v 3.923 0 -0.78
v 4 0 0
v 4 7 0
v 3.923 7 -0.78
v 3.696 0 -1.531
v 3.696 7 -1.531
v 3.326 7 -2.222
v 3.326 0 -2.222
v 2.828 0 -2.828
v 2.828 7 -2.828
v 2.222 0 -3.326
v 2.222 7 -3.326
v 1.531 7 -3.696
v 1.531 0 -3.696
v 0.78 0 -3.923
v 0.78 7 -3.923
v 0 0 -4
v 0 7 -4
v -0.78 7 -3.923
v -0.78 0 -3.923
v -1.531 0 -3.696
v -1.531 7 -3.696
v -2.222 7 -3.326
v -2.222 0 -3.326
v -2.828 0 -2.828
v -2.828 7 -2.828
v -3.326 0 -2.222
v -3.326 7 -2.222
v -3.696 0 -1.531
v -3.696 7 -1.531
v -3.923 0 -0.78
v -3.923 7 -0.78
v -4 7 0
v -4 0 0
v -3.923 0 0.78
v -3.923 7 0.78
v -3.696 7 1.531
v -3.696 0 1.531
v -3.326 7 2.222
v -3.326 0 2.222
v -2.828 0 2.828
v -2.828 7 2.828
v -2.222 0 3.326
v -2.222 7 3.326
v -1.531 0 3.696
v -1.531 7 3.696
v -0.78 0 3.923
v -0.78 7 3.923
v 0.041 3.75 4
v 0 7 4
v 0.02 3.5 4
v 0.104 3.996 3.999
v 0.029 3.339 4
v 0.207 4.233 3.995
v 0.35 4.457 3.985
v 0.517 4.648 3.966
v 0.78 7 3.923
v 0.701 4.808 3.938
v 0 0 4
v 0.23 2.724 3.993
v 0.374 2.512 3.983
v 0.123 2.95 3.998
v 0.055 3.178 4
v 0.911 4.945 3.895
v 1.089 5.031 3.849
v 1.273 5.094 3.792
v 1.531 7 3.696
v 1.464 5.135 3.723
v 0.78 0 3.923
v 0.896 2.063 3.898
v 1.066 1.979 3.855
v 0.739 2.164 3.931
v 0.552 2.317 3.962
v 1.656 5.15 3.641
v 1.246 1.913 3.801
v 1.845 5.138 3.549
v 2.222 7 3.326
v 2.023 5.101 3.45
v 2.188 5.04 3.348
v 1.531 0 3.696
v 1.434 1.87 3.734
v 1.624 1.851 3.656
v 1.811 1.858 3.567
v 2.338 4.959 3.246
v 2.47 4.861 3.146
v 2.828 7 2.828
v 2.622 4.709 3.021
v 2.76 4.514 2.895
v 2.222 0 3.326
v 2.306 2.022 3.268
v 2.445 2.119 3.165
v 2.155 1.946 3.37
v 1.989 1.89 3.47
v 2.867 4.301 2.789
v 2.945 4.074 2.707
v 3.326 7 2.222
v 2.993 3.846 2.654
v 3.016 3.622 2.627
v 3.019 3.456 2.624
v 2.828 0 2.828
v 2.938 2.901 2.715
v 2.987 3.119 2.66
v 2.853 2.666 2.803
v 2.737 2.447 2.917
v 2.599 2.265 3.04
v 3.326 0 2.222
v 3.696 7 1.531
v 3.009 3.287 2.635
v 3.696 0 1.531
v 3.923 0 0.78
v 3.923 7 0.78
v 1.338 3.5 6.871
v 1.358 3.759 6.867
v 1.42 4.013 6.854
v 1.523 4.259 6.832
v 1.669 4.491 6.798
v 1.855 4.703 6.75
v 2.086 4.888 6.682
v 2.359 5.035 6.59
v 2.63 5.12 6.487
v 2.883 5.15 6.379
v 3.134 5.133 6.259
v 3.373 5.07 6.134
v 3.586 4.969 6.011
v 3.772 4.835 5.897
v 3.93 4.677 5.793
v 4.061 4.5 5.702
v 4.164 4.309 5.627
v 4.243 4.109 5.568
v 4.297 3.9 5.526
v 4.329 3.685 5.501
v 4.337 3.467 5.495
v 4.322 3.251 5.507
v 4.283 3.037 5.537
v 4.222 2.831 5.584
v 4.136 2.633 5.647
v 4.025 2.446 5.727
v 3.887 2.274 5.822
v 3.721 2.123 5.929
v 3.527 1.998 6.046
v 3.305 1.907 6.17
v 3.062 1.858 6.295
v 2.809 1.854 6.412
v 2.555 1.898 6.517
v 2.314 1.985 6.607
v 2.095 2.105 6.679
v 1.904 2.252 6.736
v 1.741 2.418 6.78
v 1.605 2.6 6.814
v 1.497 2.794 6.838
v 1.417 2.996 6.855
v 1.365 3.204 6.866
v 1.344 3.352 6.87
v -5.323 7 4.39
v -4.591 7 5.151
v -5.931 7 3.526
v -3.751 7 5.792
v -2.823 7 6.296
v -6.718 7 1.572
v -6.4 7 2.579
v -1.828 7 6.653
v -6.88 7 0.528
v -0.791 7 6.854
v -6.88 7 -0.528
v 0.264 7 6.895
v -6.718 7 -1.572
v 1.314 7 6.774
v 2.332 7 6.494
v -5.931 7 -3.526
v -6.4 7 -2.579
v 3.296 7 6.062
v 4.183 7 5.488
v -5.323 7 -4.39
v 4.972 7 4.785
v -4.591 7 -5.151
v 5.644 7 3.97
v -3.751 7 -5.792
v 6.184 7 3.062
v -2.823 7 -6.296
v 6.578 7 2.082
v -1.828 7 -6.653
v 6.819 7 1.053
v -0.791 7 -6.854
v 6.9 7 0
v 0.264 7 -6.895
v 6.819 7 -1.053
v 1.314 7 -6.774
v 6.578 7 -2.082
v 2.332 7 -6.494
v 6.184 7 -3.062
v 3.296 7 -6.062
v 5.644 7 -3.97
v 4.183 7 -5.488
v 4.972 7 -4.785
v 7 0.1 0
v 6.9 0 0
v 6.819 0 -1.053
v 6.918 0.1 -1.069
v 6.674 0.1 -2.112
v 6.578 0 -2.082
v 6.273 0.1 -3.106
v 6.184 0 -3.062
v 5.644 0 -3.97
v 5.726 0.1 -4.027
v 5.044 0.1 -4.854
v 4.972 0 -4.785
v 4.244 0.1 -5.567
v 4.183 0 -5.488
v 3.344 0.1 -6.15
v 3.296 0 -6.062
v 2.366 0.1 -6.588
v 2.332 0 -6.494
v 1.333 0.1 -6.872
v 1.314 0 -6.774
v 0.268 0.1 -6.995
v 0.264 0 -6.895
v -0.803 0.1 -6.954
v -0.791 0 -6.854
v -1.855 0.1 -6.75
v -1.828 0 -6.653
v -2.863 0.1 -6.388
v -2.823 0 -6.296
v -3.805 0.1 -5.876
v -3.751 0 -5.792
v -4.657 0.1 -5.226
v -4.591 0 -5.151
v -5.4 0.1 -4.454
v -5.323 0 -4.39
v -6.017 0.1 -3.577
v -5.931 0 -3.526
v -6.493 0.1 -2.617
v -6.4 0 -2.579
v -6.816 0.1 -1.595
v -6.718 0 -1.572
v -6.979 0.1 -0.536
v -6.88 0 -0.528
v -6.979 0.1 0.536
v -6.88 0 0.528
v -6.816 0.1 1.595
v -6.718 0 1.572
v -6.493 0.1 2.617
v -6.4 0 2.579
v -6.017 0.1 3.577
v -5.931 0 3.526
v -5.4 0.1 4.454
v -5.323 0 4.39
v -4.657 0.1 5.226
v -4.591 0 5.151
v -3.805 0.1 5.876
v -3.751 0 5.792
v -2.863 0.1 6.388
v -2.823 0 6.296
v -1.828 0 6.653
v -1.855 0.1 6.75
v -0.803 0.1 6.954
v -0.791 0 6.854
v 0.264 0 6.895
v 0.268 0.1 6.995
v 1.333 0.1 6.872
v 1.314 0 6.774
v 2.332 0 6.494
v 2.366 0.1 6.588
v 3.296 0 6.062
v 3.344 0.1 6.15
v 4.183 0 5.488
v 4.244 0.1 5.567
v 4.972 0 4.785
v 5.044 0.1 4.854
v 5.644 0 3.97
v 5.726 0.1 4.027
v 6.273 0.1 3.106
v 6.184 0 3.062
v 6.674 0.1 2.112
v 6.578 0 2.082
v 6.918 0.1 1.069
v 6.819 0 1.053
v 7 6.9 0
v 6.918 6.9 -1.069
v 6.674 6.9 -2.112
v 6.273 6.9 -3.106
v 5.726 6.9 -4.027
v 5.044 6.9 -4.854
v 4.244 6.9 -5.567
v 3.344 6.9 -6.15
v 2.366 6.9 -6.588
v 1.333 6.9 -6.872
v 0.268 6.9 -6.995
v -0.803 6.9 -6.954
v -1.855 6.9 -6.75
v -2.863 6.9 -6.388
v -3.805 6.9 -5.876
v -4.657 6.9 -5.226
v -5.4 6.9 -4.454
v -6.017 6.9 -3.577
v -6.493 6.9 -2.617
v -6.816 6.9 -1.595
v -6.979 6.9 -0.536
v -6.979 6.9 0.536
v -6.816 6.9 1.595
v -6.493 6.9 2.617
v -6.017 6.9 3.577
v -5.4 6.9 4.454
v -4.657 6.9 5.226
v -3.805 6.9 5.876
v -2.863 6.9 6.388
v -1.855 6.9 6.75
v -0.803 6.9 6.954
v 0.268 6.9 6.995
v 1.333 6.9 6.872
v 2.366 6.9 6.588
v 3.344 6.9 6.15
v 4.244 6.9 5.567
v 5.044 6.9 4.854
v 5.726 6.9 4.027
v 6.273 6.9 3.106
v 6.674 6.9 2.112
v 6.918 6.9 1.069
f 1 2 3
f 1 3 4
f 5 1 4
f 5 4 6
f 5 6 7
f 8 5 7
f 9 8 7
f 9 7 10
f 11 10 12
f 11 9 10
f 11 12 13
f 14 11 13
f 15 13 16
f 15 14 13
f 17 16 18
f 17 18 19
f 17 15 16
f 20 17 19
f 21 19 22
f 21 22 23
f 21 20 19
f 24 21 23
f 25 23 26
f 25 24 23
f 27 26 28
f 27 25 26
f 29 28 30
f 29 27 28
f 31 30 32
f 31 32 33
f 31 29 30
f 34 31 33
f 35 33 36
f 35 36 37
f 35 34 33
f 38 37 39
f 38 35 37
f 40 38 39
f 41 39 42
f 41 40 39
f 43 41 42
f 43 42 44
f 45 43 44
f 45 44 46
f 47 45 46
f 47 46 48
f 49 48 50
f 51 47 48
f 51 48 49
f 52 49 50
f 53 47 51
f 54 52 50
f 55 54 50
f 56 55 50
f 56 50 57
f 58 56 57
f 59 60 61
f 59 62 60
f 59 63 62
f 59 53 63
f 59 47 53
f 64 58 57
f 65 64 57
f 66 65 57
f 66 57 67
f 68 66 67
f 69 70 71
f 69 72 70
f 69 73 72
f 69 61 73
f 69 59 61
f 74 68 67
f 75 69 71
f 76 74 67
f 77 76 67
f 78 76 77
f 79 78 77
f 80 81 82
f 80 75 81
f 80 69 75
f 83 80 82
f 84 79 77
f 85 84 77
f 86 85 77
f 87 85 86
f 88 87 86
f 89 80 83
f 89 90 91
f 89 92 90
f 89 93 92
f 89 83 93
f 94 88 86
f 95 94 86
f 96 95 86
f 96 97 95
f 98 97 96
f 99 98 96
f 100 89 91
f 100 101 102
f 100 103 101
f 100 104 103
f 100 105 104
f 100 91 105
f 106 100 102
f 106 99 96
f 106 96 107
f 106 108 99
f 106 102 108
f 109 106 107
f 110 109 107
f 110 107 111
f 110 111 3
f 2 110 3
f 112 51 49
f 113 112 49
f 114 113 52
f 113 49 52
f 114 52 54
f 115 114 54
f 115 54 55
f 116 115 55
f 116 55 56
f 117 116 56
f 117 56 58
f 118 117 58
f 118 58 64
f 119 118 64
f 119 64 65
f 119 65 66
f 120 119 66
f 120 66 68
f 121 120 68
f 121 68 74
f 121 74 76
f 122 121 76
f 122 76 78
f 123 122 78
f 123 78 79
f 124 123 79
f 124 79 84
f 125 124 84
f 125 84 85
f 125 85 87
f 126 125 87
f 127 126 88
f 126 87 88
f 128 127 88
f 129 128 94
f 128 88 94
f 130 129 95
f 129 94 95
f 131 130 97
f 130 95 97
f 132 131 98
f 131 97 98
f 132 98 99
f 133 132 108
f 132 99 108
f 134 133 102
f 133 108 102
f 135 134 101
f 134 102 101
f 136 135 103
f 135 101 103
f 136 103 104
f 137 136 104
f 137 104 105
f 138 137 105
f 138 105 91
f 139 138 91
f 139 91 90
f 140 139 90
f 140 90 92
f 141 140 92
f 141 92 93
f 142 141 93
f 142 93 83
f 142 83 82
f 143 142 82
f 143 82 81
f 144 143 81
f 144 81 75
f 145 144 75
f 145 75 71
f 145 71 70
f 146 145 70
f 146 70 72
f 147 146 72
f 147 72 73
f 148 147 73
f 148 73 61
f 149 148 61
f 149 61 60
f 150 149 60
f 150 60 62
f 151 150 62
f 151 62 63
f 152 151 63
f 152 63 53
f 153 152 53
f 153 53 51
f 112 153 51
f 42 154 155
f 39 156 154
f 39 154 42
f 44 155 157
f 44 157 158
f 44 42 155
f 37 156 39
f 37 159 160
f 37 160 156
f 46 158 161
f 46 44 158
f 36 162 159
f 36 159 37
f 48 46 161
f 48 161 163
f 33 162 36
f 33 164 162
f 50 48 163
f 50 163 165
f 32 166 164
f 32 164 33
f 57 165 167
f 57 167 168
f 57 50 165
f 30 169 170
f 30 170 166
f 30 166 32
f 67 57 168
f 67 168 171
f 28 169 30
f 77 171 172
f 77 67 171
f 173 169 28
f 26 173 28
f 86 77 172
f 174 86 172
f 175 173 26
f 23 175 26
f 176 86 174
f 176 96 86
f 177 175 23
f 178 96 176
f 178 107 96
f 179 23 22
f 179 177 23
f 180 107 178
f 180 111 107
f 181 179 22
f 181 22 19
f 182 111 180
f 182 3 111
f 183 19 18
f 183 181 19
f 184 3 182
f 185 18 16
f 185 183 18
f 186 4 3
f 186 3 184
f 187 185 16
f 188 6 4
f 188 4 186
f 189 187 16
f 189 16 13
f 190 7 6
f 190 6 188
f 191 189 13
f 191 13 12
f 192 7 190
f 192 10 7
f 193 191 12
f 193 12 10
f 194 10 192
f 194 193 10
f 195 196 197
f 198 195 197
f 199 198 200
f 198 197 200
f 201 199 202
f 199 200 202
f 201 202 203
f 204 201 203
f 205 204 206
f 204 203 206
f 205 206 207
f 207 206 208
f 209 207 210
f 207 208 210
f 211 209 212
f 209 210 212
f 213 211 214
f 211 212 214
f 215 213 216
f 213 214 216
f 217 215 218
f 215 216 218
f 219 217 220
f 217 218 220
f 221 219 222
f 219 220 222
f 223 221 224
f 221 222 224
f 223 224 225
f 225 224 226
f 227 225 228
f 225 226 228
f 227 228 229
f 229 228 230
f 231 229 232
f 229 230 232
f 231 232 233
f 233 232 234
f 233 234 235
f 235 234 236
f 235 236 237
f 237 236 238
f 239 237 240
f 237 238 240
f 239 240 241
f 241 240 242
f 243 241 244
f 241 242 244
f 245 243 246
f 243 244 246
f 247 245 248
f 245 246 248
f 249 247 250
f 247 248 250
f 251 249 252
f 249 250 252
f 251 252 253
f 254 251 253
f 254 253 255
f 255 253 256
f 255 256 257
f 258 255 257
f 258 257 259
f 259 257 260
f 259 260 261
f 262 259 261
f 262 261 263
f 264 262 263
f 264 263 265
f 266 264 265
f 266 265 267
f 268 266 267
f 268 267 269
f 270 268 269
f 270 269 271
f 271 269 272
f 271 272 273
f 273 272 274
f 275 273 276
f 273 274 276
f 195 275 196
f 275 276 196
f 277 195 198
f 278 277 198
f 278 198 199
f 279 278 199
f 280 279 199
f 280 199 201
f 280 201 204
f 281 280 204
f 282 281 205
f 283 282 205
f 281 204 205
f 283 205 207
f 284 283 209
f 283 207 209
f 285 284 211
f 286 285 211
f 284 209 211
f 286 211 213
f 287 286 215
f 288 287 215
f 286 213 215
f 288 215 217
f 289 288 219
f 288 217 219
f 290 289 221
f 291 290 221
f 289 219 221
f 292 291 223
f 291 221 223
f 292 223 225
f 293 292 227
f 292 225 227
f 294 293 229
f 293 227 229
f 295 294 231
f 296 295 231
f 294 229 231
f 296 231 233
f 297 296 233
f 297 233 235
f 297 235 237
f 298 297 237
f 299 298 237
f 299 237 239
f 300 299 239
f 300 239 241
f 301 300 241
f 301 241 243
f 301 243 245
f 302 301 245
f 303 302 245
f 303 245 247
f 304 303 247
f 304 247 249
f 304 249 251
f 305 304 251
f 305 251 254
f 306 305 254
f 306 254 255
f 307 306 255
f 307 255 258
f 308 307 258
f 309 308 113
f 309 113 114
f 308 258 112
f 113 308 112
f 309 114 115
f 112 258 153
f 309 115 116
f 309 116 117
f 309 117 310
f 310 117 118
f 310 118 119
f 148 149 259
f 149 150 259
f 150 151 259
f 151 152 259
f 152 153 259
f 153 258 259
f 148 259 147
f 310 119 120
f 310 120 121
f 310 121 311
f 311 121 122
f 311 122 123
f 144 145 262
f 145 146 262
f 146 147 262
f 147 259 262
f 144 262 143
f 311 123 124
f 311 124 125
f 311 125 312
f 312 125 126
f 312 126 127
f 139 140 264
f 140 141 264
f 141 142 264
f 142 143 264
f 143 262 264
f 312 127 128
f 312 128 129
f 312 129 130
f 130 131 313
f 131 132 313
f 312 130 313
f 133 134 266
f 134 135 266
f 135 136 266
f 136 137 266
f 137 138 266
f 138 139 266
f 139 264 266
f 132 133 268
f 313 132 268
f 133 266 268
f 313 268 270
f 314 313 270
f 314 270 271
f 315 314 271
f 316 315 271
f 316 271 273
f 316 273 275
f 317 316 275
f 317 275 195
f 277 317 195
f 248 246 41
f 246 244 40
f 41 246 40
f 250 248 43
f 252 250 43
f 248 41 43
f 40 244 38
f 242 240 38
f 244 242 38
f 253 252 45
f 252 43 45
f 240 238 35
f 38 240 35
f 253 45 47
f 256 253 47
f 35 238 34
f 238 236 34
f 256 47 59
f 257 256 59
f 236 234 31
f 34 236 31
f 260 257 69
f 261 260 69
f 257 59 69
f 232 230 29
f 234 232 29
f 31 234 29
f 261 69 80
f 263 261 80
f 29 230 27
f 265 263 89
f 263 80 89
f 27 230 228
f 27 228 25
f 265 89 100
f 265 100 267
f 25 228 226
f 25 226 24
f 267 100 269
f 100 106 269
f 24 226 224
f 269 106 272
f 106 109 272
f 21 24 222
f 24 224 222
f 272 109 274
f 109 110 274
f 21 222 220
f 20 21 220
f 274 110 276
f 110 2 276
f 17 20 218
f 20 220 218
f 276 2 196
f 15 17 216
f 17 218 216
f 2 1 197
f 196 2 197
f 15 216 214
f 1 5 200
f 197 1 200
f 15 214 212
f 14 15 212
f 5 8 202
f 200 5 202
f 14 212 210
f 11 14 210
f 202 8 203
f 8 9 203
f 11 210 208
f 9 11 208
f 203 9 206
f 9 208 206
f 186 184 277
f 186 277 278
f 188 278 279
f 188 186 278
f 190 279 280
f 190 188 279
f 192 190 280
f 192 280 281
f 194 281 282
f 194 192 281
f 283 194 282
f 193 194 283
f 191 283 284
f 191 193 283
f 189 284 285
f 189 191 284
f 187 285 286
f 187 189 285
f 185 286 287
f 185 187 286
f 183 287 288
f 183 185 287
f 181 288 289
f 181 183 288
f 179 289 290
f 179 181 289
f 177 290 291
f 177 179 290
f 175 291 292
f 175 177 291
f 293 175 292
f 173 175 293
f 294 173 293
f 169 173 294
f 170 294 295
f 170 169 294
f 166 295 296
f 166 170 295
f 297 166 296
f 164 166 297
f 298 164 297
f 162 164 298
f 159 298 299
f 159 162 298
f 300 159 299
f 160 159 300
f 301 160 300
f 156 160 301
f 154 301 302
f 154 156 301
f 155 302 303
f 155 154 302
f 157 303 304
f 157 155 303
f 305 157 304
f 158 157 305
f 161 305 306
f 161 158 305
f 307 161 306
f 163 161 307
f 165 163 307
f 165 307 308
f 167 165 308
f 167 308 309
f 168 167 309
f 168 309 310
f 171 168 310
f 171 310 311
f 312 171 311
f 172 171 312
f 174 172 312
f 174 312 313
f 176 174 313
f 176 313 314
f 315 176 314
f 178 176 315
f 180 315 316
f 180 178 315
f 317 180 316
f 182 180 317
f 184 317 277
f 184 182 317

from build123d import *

# Parameters (mm, degrees)
SKETCH2_R                 = 7
SKETCH2_R_2               = 4
BOSS_EXTRUDE1_DEPTH       = 7
M4X0_7_TAPPED_HOLE1_D     = 3.3
M4X0_7_TAPPED_HOLE1_DEPTH = 4
M4X0_7_TAPPED_HOLE1_TIP   = 0.991420021
CHAMFER1_SIZE             = 0.1


with BuildPart() as part:
    # Sketch2 → Boss-Extrude1 (new body)
    with BuildSketch(Plane(origin=(0, 0, 0), x_dir=(1, 0, 0), z_dir=(0, 1, 0))):
        Circle(SKETCH2_R)
        Circle(SKETCH2_R_2, mode=Mode.SUBTRACT)
    extrude(amount=BOSS_EXTRUDE1_DEPTH)

    # M4x0.7 Tapped Hole1
    with Locations(Plane(origin=(2.919589897, 3.5, 6.362074727), x_dir=(0.908867818, 0, -0.417084271), z_dir=(0.417084271, 0, 0.908867818))):
        with Locations((0, 0)):
            Hole(M4X0_7_TAPPED_HOLE1_D / 2, depth=M4X0_7_TAPPED_HOLE1_DEPTH)
            with Locations((0, 0, -(M4X0_7_TAPPED_HOLE1_DEPTH + M4X0_7_TAPPED_HOLE1_TIP / 2))):  # 118° drill point
                Cone(0, M4X0_7_TAPPED_HOLE1_D / 2, M4X0_7_TAPPED_HOLE1_TIP, mode=Mode.SUBTRACT)

    # Chamfer1
    chamfer1_edges = [part.edges().sort_by_distance(p)[0] for p in [
        (-7, 0, 0),
        (-7, 7, 0),
    ]]
    chamfer(chamfer1_edges, length=CHAMFER1_SIZE)


solid = part.part
